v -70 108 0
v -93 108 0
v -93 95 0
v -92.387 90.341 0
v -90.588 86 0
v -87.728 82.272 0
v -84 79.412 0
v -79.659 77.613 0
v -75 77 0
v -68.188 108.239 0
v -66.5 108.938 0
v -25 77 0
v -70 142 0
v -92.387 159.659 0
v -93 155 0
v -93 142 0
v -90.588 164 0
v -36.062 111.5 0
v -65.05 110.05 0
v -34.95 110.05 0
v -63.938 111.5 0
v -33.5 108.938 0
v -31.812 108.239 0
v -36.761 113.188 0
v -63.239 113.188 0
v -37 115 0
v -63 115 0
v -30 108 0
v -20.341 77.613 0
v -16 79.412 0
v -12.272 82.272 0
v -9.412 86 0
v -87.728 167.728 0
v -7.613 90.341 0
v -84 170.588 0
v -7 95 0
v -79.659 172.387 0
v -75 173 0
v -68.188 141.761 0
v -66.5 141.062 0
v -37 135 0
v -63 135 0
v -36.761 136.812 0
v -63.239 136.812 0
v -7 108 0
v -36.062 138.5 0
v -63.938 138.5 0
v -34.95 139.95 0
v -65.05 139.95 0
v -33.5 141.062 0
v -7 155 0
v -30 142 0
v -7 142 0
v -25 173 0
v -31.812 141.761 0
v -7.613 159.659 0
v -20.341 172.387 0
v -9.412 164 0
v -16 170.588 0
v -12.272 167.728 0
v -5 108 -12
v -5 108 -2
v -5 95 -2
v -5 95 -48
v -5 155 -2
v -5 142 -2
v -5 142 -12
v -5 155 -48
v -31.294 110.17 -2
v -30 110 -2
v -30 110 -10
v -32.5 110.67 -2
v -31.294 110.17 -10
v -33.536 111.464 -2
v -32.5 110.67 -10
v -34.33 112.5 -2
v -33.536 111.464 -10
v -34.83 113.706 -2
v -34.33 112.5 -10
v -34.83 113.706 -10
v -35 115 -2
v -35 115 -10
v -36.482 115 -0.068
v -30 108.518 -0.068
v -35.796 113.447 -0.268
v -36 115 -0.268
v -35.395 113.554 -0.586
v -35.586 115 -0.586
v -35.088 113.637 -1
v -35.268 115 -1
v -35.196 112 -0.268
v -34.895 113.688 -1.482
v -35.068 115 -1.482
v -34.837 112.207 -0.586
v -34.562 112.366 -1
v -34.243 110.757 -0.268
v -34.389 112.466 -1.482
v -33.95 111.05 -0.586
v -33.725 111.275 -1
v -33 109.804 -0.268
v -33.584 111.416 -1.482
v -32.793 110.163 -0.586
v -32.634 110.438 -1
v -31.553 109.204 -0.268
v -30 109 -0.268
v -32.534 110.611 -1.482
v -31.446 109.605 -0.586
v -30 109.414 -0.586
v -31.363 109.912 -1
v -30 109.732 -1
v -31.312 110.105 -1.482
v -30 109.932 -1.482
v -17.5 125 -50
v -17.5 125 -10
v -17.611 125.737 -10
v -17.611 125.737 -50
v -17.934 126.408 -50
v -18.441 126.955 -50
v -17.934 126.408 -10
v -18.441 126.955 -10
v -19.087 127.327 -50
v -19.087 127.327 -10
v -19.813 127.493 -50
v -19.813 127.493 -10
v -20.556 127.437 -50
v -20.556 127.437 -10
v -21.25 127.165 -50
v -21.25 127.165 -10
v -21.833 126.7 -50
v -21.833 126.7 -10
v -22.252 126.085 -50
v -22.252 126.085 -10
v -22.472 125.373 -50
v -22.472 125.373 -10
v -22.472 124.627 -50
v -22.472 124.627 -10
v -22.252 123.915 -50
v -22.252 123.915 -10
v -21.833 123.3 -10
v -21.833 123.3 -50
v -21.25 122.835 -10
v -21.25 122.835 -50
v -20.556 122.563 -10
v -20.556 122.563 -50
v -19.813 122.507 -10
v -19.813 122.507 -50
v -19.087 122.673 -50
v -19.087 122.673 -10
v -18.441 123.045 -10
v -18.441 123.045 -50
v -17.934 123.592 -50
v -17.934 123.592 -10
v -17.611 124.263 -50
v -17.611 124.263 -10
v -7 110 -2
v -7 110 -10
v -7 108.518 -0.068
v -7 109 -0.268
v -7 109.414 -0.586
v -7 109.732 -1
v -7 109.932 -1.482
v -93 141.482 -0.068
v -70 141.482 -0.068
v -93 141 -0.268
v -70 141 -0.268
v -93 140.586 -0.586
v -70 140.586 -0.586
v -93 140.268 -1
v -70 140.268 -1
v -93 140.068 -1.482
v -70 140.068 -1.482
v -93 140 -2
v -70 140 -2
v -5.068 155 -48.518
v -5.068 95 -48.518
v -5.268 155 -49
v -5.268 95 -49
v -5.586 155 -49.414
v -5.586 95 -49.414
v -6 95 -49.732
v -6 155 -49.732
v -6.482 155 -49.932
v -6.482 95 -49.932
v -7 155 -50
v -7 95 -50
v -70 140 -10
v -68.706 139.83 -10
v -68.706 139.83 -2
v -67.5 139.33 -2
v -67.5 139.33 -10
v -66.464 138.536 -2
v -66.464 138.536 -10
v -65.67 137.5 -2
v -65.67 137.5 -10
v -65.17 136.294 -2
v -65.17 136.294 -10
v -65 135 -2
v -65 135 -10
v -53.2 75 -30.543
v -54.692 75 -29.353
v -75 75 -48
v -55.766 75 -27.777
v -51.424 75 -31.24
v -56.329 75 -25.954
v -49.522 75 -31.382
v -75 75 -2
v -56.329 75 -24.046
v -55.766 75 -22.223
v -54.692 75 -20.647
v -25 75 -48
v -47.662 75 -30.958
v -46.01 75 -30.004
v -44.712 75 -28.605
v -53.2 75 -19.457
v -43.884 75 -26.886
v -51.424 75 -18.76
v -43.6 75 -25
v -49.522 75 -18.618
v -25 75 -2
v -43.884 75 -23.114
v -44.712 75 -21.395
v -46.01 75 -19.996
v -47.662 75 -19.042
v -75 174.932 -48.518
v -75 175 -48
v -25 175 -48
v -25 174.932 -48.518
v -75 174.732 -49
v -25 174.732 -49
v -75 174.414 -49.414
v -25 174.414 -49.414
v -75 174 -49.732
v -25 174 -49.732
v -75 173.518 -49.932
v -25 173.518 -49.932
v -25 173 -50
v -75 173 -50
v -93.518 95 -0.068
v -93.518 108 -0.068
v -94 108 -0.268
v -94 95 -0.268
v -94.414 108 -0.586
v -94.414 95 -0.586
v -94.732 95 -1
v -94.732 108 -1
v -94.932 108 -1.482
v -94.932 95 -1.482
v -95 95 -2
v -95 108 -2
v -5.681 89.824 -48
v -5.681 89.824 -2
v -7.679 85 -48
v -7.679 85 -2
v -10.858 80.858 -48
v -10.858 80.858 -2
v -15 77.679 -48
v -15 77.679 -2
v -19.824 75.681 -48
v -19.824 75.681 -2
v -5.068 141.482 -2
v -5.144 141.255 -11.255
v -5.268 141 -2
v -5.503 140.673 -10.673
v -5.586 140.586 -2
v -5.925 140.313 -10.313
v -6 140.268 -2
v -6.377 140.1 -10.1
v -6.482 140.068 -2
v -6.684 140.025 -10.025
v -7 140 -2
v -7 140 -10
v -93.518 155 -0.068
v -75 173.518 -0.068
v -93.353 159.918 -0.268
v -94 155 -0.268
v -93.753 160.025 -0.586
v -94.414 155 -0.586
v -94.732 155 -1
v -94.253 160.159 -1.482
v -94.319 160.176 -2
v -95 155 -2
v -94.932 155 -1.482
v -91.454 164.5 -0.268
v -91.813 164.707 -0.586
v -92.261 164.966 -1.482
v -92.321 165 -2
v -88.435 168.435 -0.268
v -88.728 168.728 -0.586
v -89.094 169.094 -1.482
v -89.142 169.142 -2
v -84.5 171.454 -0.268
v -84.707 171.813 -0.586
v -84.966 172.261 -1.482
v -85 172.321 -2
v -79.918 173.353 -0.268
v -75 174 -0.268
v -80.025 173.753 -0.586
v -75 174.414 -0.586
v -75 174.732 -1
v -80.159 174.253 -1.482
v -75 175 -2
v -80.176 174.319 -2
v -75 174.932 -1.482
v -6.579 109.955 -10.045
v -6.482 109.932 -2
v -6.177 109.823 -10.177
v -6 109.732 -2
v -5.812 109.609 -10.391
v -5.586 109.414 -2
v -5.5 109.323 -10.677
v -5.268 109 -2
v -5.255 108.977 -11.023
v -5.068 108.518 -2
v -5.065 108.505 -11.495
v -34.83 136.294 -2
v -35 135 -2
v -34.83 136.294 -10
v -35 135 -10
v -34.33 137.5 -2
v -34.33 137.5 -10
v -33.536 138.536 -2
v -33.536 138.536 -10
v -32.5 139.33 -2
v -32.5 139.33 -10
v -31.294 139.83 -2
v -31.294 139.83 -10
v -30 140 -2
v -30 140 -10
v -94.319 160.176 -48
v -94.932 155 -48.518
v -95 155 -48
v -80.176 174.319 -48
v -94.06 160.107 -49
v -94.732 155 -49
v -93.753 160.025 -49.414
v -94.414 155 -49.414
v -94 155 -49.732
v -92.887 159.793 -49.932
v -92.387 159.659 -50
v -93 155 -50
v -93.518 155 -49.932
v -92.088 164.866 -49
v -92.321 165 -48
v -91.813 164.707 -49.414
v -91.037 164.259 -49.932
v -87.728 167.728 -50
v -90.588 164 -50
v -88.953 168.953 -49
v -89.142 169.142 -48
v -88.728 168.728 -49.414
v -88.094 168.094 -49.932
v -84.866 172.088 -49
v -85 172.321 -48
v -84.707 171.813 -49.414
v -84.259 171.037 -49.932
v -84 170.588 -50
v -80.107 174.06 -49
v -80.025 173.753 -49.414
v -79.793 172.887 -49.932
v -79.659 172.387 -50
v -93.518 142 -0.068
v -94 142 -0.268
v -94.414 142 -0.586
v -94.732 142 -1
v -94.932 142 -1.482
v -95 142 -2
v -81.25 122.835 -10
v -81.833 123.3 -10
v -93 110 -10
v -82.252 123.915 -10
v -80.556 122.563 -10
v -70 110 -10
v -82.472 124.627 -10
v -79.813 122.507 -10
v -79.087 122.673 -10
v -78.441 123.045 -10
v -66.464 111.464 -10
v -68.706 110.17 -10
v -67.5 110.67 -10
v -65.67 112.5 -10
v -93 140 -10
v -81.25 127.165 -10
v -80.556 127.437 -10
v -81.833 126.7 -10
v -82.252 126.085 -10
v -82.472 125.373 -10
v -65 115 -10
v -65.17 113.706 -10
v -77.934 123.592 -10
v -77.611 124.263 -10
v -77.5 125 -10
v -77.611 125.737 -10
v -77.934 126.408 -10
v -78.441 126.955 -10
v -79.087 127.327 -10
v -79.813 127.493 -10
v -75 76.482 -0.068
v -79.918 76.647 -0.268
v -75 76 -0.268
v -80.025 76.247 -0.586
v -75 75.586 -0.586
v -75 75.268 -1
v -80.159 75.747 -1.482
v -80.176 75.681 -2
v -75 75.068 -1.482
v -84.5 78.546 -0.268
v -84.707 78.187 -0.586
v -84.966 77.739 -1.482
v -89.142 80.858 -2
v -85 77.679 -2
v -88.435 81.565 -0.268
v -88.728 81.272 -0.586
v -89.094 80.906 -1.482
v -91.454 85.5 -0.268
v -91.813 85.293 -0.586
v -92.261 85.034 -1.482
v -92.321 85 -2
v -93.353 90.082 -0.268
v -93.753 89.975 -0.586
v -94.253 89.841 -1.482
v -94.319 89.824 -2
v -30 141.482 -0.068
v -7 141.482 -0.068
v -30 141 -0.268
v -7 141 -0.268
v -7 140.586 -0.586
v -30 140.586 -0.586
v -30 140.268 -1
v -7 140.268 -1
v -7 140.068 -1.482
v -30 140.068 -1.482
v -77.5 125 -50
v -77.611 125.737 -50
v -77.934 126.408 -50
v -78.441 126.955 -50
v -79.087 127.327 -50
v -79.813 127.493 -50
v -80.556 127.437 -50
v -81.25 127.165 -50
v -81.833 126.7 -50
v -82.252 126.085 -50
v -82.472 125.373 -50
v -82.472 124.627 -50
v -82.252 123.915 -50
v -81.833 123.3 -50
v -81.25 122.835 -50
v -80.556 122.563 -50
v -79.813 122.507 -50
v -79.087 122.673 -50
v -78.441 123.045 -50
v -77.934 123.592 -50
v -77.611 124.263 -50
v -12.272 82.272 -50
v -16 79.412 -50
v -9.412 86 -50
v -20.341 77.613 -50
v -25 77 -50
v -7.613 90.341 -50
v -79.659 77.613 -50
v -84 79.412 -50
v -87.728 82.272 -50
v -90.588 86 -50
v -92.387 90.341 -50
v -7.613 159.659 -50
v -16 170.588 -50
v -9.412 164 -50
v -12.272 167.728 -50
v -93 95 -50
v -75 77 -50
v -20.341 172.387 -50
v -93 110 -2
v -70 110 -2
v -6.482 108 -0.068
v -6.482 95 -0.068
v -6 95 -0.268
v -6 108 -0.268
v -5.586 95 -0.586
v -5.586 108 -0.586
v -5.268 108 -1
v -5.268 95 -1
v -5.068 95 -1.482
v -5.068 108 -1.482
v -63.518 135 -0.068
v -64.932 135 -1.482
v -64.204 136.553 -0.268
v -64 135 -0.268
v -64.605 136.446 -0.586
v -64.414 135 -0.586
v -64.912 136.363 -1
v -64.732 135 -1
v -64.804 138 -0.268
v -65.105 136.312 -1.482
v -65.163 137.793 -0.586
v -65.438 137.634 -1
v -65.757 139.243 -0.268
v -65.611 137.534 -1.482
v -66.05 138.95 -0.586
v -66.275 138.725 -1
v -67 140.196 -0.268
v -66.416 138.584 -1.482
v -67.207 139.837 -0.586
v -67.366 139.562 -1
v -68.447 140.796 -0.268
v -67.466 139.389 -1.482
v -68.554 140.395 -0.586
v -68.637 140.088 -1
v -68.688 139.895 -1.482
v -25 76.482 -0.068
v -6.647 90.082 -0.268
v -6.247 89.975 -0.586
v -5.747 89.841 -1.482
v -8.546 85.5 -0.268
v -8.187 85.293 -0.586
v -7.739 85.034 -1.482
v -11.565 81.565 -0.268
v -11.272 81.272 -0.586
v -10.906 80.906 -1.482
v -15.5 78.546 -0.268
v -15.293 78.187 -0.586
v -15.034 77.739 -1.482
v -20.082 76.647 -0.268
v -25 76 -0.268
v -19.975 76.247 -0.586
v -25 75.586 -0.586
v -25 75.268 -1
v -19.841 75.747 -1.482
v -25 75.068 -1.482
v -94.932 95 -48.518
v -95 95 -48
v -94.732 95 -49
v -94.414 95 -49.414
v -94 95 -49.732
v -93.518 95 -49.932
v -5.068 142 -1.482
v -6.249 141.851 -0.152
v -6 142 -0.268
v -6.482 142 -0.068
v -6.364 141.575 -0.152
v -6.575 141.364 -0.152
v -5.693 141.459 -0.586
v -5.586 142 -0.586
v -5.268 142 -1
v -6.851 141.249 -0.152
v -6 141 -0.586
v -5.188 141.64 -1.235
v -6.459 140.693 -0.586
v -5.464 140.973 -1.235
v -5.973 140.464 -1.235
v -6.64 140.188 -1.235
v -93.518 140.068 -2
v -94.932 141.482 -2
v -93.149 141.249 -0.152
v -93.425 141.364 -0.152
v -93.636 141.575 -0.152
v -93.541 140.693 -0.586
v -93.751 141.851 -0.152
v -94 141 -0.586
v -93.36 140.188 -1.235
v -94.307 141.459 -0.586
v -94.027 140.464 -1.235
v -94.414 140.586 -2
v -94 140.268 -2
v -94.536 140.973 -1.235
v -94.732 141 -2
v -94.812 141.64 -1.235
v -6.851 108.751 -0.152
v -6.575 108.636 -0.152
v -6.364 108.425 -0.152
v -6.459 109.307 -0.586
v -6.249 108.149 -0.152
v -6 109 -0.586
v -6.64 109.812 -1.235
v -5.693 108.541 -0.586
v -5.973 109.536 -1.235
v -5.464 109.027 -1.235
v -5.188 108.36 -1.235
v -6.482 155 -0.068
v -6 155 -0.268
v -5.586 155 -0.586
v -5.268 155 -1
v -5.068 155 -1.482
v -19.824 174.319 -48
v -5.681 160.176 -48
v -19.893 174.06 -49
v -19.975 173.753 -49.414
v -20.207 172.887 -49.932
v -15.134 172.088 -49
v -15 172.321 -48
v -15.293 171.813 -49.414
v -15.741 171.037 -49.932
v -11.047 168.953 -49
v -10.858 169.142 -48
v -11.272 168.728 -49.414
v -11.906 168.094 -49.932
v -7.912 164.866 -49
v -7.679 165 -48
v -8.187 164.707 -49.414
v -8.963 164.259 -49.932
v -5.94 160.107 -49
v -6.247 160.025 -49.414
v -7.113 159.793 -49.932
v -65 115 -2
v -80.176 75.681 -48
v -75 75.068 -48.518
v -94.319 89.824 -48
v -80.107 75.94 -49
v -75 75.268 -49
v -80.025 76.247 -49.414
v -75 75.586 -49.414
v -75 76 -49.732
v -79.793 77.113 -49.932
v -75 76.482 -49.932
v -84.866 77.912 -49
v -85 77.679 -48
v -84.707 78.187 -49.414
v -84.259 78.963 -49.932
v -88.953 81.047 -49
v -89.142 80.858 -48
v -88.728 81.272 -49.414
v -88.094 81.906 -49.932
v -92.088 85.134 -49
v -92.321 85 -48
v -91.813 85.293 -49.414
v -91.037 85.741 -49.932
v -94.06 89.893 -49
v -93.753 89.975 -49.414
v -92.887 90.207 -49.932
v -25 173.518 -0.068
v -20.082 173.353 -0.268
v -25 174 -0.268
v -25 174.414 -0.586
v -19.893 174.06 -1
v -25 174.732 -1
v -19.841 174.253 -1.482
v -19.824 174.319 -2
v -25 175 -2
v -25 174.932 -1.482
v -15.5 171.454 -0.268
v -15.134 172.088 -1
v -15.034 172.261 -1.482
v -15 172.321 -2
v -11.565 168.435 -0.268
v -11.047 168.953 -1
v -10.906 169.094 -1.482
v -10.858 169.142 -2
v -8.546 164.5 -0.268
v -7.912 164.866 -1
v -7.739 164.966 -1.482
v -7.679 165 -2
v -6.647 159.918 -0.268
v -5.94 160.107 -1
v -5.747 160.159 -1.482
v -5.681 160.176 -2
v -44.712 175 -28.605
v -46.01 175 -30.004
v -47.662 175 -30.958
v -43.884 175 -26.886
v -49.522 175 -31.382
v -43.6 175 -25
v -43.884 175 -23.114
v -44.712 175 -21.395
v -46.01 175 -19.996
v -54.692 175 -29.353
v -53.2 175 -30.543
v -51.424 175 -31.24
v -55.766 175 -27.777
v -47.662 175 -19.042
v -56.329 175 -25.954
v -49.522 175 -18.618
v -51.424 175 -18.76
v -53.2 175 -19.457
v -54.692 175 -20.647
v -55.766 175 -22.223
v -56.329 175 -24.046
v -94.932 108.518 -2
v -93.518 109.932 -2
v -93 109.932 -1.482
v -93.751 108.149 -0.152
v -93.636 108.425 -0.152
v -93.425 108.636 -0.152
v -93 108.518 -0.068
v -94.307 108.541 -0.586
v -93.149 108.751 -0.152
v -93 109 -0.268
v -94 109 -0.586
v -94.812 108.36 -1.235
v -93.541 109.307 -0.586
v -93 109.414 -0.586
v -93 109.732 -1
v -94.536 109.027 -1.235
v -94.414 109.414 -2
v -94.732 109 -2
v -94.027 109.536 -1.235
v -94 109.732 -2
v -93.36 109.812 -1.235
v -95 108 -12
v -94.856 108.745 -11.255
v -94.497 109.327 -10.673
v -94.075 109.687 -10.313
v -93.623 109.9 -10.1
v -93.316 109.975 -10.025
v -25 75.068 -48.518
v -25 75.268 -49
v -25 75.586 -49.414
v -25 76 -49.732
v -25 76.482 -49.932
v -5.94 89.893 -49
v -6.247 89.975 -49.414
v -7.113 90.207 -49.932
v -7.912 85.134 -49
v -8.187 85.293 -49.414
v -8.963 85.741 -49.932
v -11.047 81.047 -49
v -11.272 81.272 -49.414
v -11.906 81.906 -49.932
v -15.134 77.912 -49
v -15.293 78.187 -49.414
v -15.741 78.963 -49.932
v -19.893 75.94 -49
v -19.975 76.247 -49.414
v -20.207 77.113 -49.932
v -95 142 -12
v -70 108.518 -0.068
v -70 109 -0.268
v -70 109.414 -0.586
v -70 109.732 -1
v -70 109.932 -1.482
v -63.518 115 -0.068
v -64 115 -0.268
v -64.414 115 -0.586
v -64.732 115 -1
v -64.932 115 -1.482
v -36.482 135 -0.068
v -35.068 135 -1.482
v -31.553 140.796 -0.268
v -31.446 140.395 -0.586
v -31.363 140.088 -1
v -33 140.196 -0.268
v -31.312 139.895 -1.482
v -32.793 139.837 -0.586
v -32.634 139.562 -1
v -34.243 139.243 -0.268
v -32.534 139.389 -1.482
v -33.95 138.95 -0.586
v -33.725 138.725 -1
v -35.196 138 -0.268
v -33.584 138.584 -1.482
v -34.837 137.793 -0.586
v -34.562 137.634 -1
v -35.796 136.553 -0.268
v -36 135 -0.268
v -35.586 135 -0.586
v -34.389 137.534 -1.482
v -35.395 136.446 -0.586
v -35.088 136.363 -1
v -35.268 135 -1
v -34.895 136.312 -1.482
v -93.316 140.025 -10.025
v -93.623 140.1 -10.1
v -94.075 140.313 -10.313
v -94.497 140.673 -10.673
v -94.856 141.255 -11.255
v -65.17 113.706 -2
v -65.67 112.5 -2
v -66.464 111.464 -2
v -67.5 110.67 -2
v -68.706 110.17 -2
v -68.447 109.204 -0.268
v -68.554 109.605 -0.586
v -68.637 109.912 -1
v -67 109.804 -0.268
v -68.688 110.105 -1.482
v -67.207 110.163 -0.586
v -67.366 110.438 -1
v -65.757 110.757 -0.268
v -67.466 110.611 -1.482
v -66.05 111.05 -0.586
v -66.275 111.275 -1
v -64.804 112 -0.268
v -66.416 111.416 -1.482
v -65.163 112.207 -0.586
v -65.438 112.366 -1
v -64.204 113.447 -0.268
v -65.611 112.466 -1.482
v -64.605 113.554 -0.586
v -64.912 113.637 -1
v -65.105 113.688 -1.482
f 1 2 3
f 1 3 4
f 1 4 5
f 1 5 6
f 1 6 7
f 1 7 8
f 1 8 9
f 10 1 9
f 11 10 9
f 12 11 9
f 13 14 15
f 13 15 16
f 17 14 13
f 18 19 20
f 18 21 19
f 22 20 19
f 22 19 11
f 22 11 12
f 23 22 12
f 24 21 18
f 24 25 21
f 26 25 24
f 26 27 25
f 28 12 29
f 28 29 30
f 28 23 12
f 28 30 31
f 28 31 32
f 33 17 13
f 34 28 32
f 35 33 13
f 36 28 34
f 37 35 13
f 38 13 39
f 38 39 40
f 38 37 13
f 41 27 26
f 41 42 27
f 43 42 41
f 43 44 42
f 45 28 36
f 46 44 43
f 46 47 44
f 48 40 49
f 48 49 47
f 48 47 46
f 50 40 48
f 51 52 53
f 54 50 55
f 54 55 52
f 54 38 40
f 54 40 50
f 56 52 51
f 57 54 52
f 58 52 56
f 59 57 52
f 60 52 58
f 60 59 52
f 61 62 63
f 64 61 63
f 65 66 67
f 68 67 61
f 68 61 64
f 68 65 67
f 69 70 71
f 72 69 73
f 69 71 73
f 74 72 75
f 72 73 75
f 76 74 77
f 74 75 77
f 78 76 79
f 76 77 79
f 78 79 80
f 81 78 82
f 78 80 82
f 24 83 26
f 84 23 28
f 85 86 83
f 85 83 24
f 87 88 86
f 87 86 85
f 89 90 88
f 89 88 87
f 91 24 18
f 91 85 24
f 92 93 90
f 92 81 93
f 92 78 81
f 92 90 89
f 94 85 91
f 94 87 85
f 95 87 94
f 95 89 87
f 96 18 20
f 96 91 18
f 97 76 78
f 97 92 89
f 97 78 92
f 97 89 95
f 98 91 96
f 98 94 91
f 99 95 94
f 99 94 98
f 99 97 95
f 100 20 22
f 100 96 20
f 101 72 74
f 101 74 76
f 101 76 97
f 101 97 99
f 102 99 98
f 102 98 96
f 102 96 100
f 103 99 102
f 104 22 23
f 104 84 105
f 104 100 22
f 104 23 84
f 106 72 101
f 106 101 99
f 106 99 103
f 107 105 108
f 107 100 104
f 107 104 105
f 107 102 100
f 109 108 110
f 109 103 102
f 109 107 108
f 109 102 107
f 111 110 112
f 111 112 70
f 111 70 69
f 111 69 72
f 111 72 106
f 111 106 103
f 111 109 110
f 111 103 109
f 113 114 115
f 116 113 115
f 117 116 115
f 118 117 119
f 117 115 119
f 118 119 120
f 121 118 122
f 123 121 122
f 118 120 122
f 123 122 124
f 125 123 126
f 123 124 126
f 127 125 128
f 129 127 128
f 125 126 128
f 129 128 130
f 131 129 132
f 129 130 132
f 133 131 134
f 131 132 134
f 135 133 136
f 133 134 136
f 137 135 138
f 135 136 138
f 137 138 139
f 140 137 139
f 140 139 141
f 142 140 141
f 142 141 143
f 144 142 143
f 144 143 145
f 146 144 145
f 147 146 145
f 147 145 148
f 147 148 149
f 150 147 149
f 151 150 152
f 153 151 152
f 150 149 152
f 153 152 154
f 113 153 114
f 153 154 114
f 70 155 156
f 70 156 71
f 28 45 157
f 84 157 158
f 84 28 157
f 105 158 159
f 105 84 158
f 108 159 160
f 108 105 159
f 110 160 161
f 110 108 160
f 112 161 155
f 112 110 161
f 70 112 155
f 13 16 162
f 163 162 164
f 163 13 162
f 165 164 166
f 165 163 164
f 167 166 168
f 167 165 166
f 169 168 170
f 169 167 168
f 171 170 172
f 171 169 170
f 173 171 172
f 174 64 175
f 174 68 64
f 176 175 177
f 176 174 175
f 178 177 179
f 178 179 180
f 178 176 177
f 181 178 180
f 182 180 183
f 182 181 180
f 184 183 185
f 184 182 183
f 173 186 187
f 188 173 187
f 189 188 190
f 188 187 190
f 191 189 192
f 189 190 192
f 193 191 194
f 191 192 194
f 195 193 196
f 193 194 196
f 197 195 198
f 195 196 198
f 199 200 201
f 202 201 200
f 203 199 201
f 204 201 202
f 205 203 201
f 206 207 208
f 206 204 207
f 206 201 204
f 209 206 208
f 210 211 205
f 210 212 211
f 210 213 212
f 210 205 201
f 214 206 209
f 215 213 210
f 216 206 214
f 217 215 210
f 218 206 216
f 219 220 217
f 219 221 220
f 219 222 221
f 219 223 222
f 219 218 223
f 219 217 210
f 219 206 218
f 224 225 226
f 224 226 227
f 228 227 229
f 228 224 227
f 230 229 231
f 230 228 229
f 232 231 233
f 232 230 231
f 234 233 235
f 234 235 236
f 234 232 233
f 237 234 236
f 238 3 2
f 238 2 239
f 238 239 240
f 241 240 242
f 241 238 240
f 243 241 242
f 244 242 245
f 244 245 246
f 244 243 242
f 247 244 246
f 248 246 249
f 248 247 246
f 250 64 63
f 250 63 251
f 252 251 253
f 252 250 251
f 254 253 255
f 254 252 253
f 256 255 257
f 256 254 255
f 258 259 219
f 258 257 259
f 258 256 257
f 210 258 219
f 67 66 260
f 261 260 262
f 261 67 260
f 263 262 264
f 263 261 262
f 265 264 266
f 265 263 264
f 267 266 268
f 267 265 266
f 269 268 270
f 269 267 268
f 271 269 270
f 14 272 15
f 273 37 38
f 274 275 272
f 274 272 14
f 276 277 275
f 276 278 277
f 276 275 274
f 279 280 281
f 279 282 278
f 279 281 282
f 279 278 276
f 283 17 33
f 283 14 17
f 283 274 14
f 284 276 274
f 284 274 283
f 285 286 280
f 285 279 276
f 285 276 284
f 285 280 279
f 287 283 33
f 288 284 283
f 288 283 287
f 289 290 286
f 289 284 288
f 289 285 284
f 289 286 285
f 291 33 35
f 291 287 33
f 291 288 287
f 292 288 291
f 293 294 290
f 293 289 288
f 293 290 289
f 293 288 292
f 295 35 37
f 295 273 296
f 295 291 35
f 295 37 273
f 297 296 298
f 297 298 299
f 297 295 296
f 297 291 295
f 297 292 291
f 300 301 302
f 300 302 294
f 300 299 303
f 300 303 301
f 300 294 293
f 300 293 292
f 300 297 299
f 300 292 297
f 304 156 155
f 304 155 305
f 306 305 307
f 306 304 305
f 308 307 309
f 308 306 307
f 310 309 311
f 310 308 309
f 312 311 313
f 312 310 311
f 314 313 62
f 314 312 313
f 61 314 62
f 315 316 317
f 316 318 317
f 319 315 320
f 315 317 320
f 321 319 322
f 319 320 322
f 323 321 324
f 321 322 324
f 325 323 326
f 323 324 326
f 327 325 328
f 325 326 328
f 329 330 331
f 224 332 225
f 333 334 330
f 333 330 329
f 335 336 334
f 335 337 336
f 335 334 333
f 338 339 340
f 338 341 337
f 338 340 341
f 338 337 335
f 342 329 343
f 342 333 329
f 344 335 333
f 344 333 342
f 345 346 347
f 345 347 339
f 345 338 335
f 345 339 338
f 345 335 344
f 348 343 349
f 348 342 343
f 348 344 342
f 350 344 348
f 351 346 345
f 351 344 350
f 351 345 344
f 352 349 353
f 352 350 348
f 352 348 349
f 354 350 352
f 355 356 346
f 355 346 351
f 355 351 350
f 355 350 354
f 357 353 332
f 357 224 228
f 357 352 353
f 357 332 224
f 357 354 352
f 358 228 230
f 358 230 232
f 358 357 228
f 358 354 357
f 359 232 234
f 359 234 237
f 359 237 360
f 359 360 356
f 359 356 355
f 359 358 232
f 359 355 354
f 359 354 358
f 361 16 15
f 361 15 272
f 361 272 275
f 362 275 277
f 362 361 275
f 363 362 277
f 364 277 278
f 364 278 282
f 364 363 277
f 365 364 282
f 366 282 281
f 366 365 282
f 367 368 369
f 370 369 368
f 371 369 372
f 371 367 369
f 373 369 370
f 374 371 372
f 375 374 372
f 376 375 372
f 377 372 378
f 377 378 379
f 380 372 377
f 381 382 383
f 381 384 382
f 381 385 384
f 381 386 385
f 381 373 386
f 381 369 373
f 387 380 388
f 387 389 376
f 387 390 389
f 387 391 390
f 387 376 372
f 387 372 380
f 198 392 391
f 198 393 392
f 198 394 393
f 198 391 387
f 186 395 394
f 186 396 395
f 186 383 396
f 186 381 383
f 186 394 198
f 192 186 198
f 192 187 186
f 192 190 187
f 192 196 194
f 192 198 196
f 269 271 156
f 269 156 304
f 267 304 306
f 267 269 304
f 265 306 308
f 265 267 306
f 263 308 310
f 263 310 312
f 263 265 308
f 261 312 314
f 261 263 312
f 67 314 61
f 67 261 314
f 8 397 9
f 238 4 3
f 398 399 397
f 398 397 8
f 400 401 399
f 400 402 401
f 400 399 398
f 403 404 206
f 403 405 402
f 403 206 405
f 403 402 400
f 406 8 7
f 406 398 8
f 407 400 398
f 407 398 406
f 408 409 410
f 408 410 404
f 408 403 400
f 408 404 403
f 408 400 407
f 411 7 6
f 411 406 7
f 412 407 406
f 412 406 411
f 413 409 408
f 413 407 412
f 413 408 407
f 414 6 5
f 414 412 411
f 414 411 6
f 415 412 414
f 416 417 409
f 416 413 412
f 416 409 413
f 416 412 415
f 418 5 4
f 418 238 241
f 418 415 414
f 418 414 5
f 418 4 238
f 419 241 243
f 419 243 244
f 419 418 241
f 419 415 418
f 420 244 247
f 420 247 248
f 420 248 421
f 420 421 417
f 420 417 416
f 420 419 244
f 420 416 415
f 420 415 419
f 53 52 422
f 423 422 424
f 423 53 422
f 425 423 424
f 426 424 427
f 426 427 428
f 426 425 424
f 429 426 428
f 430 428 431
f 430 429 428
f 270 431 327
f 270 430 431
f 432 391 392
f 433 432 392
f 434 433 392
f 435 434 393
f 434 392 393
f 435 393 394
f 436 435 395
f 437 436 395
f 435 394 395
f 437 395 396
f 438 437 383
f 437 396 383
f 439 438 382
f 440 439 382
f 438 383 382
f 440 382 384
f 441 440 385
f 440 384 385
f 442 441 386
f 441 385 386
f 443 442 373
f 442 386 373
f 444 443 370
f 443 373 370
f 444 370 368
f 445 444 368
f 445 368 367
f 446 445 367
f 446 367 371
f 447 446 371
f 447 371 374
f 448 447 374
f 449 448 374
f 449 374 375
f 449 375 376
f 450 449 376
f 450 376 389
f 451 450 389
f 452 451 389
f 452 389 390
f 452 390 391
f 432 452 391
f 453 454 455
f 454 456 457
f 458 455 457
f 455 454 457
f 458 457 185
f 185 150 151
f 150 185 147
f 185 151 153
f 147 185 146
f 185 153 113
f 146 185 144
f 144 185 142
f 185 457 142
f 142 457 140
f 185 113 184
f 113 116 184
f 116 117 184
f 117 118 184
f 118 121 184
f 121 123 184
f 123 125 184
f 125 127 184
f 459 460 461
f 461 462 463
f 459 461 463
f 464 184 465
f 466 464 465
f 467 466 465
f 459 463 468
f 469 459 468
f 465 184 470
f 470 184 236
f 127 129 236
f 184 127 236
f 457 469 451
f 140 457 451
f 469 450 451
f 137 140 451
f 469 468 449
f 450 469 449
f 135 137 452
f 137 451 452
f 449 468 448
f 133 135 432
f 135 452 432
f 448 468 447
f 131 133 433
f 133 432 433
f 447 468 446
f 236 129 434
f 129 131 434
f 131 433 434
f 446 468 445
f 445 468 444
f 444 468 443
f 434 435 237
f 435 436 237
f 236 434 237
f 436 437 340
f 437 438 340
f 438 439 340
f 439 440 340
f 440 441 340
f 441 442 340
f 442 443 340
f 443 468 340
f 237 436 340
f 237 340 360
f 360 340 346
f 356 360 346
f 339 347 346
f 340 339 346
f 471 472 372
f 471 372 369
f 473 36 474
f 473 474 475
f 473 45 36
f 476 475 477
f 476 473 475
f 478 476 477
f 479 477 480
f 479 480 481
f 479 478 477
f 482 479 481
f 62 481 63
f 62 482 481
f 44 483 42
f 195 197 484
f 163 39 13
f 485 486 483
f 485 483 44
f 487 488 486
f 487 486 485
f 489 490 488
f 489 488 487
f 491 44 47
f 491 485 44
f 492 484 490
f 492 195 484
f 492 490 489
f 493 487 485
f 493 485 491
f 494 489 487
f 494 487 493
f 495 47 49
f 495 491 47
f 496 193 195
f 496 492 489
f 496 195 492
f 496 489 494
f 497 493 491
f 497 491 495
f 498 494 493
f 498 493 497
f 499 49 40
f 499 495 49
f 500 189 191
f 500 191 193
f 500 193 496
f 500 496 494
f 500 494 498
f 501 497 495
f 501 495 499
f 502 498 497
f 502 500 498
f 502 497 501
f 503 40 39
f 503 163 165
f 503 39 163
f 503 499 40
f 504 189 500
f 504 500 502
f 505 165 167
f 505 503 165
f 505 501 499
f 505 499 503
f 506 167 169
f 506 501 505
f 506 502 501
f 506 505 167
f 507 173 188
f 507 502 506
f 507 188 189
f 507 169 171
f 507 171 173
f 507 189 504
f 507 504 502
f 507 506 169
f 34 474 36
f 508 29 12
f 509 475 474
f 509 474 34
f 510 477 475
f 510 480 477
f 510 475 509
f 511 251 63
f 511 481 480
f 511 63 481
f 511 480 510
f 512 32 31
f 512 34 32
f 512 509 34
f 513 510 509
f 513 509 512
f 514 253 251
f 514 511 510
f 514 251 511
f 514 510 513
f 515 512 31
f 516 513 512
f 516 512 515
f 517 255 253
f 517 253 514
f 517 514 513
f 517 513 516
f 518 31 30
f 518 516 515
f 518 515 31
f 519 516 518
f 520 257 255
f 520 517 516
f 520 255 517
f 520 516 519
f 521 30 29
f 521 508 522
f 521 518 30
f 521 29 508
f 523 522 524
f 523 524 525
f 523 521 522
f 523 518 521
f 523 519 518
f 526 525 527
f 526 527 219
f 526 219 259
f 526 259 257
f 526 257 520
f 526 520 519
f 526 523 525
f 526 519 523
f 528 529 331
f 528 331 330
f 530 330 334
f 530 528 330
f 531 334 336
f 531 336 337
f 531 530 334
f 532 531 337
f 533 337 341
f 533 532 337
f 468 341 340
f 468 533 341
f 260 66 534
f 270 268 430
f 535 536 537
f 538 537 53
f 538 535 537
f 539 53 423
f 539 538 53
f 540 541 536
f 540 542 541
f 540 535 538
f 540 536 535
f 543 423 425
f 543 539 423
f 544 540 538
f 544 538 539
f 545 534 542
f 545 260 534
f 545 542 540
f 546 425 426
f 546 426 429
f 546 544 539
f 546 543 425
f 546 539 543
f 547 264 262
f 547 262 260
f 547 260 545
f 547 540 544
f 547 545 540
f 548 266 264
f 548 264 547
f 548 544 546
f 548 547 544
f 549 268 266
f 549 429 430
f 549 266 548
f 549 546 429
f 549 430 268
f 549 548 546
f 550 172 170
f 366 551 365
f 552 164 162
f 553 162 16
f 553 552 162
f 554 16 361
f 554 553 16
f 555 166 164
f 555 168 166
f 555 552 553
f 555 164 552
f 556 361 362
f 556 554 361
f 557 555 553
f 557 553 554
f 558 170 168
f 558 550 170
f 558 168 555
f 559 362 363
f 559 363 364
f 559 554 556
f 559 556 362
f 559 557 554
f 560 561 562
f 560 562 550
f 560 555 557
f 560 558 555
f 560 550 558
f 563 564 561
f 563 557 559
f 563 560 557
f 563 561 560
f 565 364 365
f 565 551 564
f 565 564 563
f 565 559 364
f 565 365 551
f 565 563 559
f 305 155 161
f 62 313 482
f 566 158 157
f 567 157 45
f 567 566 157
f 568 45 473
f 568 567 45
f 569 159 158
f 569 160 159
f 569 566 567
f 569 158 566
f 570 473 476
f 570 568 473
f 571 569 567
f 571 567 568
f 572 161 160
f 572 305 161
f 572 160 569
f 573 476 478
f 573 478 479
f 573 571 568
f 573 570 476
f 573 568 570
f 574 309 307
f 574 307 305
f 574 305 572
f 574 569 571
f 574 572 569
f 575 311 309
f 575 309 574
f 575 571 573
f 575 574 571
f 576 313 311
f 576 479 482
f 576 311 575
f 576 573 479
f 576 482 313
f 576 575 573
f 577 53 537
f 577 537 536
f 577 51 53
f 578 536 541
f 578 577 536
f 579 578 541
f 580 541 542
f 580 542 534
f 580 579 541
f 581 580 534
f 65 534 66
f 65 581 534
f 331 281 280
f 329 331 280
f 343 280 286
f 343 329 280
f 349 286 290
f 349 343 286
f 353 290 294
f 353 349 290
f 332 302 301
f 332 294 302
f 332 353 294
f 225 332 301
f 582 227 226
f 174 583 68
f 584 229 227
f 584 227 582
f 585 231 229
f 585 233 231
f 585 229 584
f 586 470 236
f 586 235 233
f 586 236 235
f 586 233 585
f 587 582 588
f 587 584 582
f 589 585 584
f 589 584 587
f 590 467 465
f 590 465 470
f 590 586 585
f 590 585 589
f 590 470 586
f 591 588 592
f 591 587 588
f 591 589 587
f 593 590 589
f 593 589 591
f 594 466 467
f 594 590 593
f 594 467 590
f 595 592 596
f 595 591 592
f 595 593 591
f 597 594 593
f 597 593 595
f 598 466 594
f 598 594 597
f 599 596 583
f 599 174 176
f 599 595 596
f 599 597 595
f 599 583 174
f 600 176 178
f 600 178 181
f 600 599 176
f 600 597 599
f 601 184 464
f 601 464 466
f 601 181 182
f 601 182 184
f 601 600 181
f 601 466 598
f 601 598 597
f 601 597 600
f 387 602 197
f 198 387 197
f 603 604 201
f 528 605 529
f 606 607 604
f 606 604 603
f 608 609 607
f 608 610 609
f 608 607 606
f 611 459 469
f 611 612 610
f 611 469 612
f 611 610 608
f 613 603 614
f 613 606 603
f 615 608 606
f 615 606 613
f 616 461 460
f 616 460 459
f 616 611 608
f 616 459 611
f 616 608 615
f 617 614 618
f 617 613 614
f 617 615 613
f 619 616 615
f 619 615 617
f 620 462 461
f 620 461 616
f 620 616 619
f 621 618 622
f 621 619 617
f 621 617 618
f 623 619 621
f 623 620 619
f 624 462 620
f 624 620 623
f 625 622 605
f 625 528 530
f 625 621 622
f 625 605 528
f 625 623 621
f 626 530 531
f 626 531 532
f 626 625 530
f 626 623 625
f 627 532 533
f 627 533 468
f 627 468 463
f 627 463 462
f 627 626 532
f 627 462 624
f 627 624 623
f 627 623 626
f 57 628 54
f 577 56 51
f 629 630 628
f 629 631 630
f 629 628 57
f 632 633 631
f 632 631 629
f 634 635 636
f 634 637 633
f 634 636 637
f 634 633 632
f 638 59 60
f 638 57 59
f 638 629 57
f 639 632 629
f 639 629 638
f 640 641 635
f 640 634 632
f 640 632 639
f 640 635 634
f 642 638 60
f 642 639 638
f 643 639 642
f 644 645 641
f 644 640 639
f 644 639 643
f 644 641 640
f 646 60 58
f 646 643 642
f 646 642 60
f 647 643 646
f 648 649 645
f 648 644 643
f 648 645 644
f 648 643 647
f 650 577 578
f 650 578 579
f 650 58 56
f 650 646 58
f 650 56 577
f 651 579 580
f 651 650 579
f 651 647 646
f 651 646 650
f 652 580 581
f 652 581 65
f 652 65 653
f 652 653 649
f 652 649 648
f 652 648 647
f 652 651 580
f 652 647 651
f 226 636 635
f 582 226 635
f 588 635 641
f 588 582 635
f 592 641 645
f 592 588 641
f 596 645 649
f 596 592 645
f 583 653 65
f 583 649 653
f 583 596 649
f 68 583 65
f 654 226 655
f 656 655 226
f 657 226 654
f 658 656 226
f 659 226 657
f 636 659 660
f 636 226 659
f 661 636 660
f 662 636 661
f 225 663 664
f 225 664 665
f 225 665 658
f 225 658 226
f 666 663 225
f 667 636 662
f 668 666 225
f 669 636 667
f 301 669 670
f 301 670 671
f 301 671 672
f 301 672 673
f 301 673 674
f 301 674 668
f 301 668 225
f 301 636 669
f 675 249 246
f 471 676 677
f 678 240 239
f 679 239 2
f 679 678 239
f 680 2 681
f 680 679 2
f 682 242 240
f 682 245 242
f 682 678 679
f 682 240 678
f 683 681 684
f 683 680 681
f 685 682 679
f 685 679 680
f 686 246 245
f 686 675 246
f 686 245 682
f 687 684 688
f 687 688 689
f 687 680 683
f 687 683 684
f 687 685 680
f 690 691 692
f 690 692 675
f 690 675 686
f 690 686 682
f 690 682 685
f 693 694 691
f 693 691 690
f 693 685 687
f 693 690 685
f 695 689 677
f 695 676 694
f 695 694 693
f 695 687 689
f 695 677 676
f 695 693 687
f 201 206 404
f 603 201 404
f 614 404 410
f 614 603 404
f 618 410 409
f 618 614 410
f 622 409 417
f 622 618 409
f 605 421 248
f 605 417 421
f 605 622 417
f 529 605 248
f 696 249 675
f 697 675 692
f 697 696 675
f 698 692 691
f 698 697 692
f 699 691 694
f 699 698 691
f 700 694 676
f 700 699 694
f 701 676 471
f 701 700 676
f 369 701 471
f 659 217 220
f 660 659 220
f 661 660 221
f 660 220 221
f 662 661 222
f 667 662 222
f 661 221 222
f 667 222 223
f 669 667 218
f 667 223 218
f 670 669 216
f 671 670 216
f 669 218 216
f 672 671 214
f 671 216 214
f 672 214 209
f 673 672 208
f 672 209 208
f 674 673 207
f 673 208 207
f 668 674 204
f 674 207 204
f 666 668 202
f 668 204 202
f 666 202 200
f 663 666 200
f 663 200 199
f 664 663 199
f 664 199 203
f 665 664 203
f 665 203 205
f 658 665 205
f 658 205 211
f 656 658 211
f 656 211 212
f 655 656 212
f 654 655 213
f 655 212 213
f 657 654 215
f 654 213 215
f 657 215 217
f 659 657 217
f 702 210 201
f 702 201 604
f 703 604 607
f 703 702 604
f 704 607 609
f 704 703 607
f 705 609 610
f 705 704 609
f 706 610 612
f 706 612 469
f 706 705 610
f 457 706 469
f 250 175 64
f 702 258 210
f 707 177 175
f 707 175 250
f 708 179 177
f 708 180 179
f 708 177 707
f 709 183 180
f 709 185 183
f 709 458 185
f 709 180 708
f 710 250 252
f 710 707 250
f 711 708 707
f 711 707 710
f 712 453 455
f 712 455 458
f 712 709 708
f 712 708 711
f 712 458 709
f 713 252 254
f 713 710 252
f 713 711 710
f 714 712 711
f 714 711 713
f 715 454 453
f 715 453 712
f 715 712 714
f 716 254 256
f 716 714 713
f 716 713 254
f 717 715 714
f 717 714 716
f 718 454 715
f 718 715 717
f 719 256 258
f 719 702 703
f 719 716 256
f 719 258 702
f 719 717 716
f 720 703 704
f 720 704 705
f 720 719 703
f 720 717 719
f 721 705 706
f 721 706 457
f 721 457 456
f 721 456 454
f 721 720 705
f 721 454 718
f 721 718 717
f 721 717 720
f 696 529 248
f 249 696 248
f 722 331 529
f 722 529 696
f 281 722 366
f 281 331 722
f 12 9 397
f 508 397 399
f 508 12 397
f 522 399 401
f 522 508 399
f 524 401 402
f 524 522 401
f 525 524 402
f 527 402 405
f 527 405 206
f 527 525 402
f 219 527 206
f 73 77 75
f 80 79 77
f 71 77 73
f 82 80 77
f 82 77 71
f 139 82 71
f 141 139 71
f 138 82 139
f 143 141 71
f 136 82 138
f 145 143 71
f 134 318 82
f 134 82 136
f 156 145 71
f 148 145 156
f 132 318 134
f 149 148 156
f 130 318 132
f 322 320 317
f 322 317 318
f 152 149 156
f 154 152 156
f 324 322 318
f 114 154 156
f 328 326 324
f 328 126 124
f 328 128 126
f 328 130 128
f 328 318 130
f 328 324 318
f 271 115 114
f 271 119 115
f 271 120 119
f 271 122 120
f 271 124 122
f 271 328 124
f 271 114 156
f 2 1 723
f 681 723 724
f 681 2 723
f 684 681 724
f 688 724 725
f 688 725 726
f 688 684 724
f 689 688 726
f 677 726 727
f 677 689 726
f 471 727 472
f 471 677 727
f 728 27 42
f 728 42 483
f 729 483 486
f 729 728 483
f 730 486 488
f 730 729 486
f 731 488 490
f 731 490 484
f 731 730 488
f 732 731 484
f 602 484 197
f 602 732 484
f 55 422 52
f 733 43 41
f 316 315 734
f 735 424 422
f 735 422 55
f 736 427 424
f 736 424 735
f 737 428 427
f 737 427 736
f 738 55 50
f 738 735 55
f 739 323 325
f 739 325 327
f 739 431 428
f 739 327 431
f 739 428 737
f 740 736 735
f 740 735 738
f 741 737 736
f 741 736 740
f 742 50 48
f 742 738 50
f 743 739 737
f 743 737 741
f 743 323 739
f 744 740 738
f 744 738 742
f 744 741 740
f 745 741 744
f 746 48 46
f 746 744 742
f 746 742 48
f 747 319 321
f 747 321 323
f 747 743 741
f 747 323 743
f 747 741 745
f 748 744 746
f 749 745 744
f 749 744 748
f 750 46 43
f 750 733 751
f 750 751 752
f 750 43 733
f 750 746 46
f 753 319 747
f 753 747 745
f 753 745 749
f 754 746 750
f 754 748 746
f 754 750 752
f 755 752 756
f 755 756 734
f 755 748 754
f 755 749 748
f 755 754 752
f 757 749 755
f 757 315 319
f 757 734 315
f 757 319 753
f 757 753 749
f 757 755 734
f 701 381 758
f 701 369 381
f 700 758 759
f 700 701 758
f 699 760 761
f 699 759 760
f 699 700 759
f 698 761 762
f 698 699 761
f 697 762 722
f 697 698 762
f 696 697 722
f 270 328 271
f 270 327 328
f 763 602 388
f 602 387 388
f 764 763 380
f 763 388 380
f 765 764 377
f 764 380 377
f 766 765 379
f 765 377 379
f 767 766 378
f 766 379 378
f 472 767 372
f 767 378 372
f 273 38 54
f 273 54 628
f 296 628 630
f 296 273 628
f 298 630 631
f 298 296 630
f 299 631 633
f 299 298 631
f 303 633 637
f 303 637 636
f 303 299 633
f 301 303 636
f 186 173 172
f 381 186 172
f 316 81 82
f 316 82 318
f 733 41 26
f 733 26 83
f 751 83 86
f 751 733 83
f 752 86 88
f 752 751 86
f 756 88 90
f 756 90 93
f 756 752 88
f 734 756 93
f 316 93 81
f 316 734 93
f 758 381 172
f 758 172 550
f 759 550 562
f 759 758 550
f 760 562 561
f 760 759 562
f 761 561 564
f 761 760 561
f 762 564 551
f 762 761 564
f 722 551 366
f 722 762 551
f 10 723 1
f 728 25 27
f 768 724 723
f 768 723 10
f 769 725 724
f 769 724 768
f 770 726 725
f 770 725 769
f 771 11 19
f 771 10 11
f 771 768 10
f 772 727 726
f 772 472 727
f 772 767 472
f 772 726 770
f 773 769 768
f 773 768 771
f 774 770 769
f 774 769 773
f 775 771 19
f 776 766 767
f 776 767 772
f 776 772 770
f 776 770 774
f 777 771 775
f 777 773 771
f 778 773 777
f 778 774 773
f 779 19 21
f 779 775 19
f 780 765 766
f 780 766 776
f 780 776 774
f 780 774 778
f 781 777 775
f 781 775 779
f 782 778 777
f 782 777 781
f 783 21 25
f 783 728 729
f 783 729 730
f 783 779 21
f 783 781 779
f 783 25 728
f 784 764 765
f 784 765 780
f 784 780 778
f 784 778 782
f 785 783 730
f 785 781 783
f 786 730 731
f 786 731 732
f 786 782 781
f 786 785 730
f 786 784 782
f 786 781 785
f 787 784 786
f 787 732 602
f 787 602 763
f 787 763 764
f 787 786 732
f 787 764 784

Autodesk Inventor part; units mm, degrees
ref_plane "YZ Plane" through (0, 0, 0) normal (1, 0, 0) x (0, 1, 0)
ref_plane "XZ Plane" through (0, 0, 0) normal (0, 1, 0) x (-1, 0, 0)
ref_plane "XY Plane" through (0, 0, 0) normal (0, 0, 1) x (1, 0, 0)
sketch "Sketch1" plane through (0, 0, 0) normal (0, 1, 0) x (-1, 0, 0)
  line L0 (0, 0) -> (100, 0)
  line L1 (100, 0) -> (100, -50)
  line L2 (100, -50) -> (0, -50)
  line L3 (0, -50) -> (0, 0)
  dimension "d0" = 100
  dimension "d1" = 50
extrude "Extrusion1" add sketch "Sketch1" along normal blind 250
sketch "Sketch5" plane through (0, 0, -50) normal (0, 0, -1) x (-1, 0, 0)
  line L0 (0, 250) -> (100, 250) projected
  line L1 (100, 0) -> (100, 250) projected
  circle A0 centre (50, 125) radius 5
  point P0 (0, 0)
  dimension "d85" = 10
extrude "Extrusion5" cut sketch "Sketch5" against normal through all
sketch "Sketch6" plane through (0, 0, 0) normal (0, -1, 0) x (1, 0, 0)
  line L0 (-100, 0) -> (0, 0) projected
  line L1 (0, -50) -> (-15, -50)
  line L2 (-15, -50) -> (-15, 0)
  line L3 (-15, 0) -> (0, 0)
  line L4 (0, 0) -> (0, -50)
  line L5 (-100, -50) -> (-100, 0) projected
  line L6 (-100, -50) -> (-85, -50)
  line L7 (-85, -50) -> (-85, 0)
  line L8 (-85, 0) -> (-100, 0)
  line L9 (-100, 0) -> (-100, -50)
  dimension "d18" = 15
  dimension "d19" = 15
extrude "Extrusion6" cut sketch "Sketch6" against normal through all
sketch "Sketch7" plane through (0, 0, 0) normal (0, -1, 0) x (1, 0, 0)
  line L0 (-15, -50) -> (-85, -50) projected
  line L1 (-85, 0) -> (-15, 0) projected
  line L2 (-15, -50) -> (-85, -50)
  line L3 (-85, -50) -> (-85, 0)
  line L4 (-85, 0) -> (-15, 0)
  line L5 (-15, 0) -> (-15, -50)
  point P0 (0, 0)
extrude "Extrusion7" cut sketch "Sketch7" against normal blind 50
sketch "Sketch8" plane through (0, 250, 0) normal (0, 1, 0) x (1, 0, 0)
  line L0 (-15, 50) -> (-85, 50) projected
  line L1 (-15, 0) -> (-15, 50) projected
  line L2 (-85, 50) -> (-15, 50)
  line L3 (-15, 50) -> (-15, 0)
  line L4 (-15, 0) -> (-85, 0)
  line L5 (-85, 0) -> (-85, 50)
  point P0 (0, 0)
extrude "Extrusion8" cut sketch "Sketch8" against normal blind 50
sketch "Sketch14" plane through (0, 200, 0) normal (0, 1, 0) x (1, 0, 0)
  point P0 (0, 0)
sketch "Sketch15" plane through (0, 200, 0) normal (0, 1, 0) x (1, 0, 0)
  line L0 (-15, 50) -> (-15, 0) projected
  line L1 (-85, 0) -> (-85, 50) projected
  line L2 (-15, 50) -> (-85, 50)
  line L3 (-85, 50) -> (-85, 45)
  line L4 (-85, 45) -> (-15, 45)
  line L5 (-15, 45) -> (-15, 50)
  line L6 (-15, 0) -> (-85, 0)
  line L7 (-85, 0) -> (-85, 5)
  line L8 (-85, 5) -> (-15, 5)
  line L9 (-15, 5) -> (-15, 0)
  point P0 (0, 0)
  dimension "d46" = 5
  dimension "d47" = 5
extrude "Extrusion13" cut sketch "Sketch15" against normal through all contours L0 L4 L1 L2 | L0 L6 L1 L8
sketch "Sketch16" plane through (-85, 50, -45) normal (-1, 0, 0) x (0, 0, 1)
  line L0 (45, 92.6169) -> (35, 92.6169)
  line L1 (35, 92.6169) -> (35, 57.3831)
  line L2 (35, 57.3831) -> (45, 57.3831)
  line L3 (45, 57.3831) -> (45, 92.6169)
  line L4 (40, 150) -> (40, 0) projected
  line L5 (45, 92.6169) -> (35, 57.3831) construction
  line L6 (35, 92.6169) -> (45, 57.3831) construction
  line L7 (40, 92.6169) -> (40, 57.3831)
  point P0 (45, -50)
  point P1 (40, 75)
  dimension "d50" = 10
extrude "Extrusion14" add sketch "Sketch16" along normal blind 34.5 contours L4 L2 L1 L0
sketch "Sketch17" plane through (-85, 200, -5) normal (0, 0, 1) x (1, 0, 0)
  line L0 (-34.5, -92.6169) -> (-34.5, -57.3831) projected
  line L1 (-34.5, -75) -> (-29.5, -75)
  circle A0 centre (-29.5, -75) radius 2.5
  point P0 (85, -200)
  dimension "d53" = 5
  dimension "d54" = 5
extrude "Extrusion15" cut sketch "Sketch17" against normal through all
thread "Thread1" size "M5x0.8" class "6H" standard "ANSI Metric M Profile" full length
sketch "Sketch19" plane through (-119.5, 50, -45) normal (-1, 0, 0) x (0, 0, 1)
  line L0 (40, 57.3831) -> (40, 92.6169) projected
  line L1 (40, 57.3831) -> (35, 57.3831) projected
  line L2 (40, 92.6169) -> (35, 92.6169)
  line L3 (35, 92.6169) -> (35, 57.3831)
  line L4 (35, 57.3831) -> (40, 57.3831)
  line L5 (40, 57.3831) -> (40, 92.6169)
  point P0 (45, -50)
extrude "Extrusion17" add sketch "Sketch19" along normal blind 32
sketch "Sketch20" plane through (-85, 200, -5) normal (0, 0, 1) x (1, 0, 0)
  line L0 (-66.5, -92.6169) -> (-66.5, -57.3831) projected
  circle A0 centre (-61.5, -75) radius 2.5
  point P0 (85, -200)
  dimension "d73" = 5
extrude "Extrusion18" cut sketch "Sketch20" against normal blind 32
thread "Thread2" size "M5x0.8" class "6H" standard "ANSI Metric M Profile" full length
sketch "Sketch21" plane through (0, 50, 0) normal (0, -1, 0) x (1, 0, 0)
  line L0 (-15, -5) -> (-85, -5) projected
  line L1 (-15, -5) -> (-15, -45) projected
  circle A0 centre (-50, -25) radius 7.5
  point P0 (0, 0)
  dimension "d86" = 15
extrude "Extrusion19" cut sketch "Sketch21" against normal blind 55
sketch "Sketch22" plane through (0, 200, 0) normal (0, 1, 0) x (1, 0, 0)
  circle A0 centre (-50, 25) radius 7.5
  point P0 (0, 0)
  dimension "d87" = 15
extrude "Extrusion20" cut sketch "Sketch22" against normal blind 55
fillet "Fillet1" radius 10 4 edges at (-85, 200, -25) (-15, 200, -25) (-85, 50, -25) (-15, 50, -25)
sketch "Sketch23" plane through (-85, 107.3831, -10) normal (0, 0, -1) x (-1, 0, 0)
  circle A0 centre (61.5, 17.6169) radius 2.5 projected
  circle A1 centre (61.5, 17.6169) radius 2.5 projected
  line L0 (66.5, 35.2339) -> (66.5, 0) projected
  circle A2 centre (29.5, 17.6169) radius 2.5 projected
  line L1 (0, 0) -> (66.5, 0) projected
  circle A3 centre (61.5, 17.6169) radius 2.5 projected
  circle A4 centre (29.5, 17.6169) radius 2.5 projected
  line L2 (0, 0) -> (0, 35.2339) projected
  line L3 (0, 0) -> (66.5, 0) projected
  line L4 (66.5, 35.2339) -> (66.5, 0) projected
  line L5 (0, 35.2339) -> (66.5, 35.2339) projected
  point P0 (-85, -107.3831)
extrude "Extrusion21" add sketch "Sketch23" along normal blind 5
fillet "Fillet2" radius 30 2 edges at (-85, 142.6169, -10) (-85, 107.3831, -10)
fillet "Fillet3" radius 10 2 edges at (-151.5, 107.3831, -10) (-151.5, 142.6169, -10)
fillet "Fillet4" radius 20 1 edges at (-85, 125, -15)
sketch "Sketch25" plane through (-151.5, 50, -45) normal (-1, 0, 0) x (0, 0, 1)
  line L0 (30, 92.6169) -> (40, 92.6169) projected
  line L1 (30, 92.6169) -> (40, 92.6169)
  line L2 (40, 92.6169) -> (40, 57.3831)
  line L3 (40, 57.3831) -> (30, 57.3831)
  line L4 (30, 57.3831) -> (30, 92.6169)
  point P0 (45, -50)
extrude "Extrusion22" add sketch "Sketch25" against normal blind 10
fillet "Fillet5" radius 10 2 edges at (-151.5, 107.3831, -10) (-151.5, 142.6169, -10)
sketch "Sketch26" plane through (-75, 200, -5) normal (0, 0, 1) x (1, 0, 0)
  circle A0 centre (-71.5, -75) radius 2.5
  circle A1 centre (-39.5, -75) radius 2.5 projected
  point P0 (75, -200)
  dimension "d91" = 5
  dimension "d92" = 32
extrude "Extrusion23" cut sketch "Sketch26" against normal blind 10 contours A0
sketch "Sketch27" plane through (0, 200, 0) normal (0, 1, 0) x (1, 0, 0)
  line L0 (-85, 45) -> (-85, 5) projected
  line L1 (-5.7432, 0) -> (-85, 0)
  line L2 (-85, 0) -> (-85, 45)
  line L3 (-85, 45) -> (-5.7432, 45)
  line L4 (-5.7432, 45) -> (-5.7432, 0)
  line L5 (-85, 0) -> (-209.0524, 0)
  line L6 (-209.0524, 0) -> (-209.0524, 63.2581)
  line L7 (-209.0524, 63.2581) -> (-85, 63.2581)
  line L8 (-85, 63.2581) -> (-85, 0)
  point P0 (0, 0)
extrude "Extrusion24" cut sketch "Sketch27" against normal up to surface (150 mm away) contours L0 L2 L5 L6 L7 L8
sketch "Sketch28" plane through (-75, 200, -5) normal (0, 0, 1) x (1, 0, 0)
  line L0 (-10, -140) -> (-10, -10) projected
  arc A0 (-10, -140) -> (0, -150) centre (0, -140) ccw projected
  line L1 (50, -150) -> (0, -150) projected
  arc A1 (50, -150) -> (60, -140) centre (50, -140) ccw projected
  line L2 (60, -10) -> (60, -140) projected
  arc A2 (60, -10) -> (50, 0) centre (50, -10) ccw projected
  line L3 (0, 0) -> (50, 0) projected
  arc A3 (0, 0) -> (-10, -10) centre (0, -10) ccw projected
  circle A4 centre (25, -75) radius 5 projected
  line L4 (32.5, -95) -> (17.5, -95) projected
  arc A5 (50, -150) -> (60, -140) centre (50, -140) ccw projected
  line L5 (0, -150) -> (50, -150) projected
  arc A6 (-10, -140) -> (0, -150) centre (0, -140) ccw projected
  line L6 (-10, -10) -> (-10, -140) projected
  arc A7 (0, 0) -> (-10, -10) centre (0, -10) ccw projected
  line L7 (50, 0) -> (0, 0) projected
  arc A8 (60, -10) -> (50, 0) centre (50, -10) ccw projected
  line L8 (60, -140) -> (60, -10) projected
  circle A9 centre (25, -75) radius 5 projected
  point P0 (75, -200)
extrude "Extrusion25" add sketch "Sketch28" along normal blind 5
sketch "Sketch29" plane through (-25, 200, -45) normal (0, 0, -1) x (-1, 0, 0)
  arc A0 (-10, -140) -> (0, -150) centre (0, -140) ccw projected
  line L0 (50, -150) -> (0, -150) projected
  arc A1 (50, -150) -> (60, -140) centre (50, -140) ccw projected
  line L1 (60, -10) -> (60, -140) projected
  arc A2 (60, -10) -> (50, 0) centre (50, -10) ccw projected
  line L2 (0, 0) -> (50, 0) projected
  arc A3 (0, 0) -> (-10, -10) centre (0, -10) ccw projected
  line L3 (-10, -140) -> (-10, -10) projected
  circle A4 centre (25, -75) radius 5 projected
  point P0 (-25, -200)
extrude "Extrusion26" add sketch "Sketch29" along normal blind 5
sketch "Sketch37" plane through (-75, 200, 0) normal (0, 0, 1) x (1, 0, 0)
  point P0 (75, -200)
sketch "Sketch38" plane through (0, 50, 0) normal (0, -1, 0) x (1, 0, 0)
  line L0 (-85, 0) -> (-15, 0)
  line L1 (-15, 0) -> (-15, -50)
  line L2 (-15, -50) -> (-85, -50)
  line L3 (-85, -50) -> (-85, 0)
  circle A0 centre (-50, -25) radius 7.5 projected
  line L4 (-85, 0) -> (-15, -50) construction
  line L5 (-15, 0) -> (-85, -50) construction
  point P0 (0, 0)
extrude "Extrusion32" cut sketch "Sketch38" against normal blind 10
sketch "Sketch39" plane through (0, 200, 0) normal (0, 1, 0) x (1, 0, 0)
  line L0 (-15, 0) -> (-85, 0)
  line L1 (-85, 0) -> (-85, 50)
  line L2 (-85, 50) -> (-15, 50)
  line L3 (-15, 50) -> (-15, 0)
  circle A0 centre (-50, 25) radius 7.5 projected
  line L4 (-15, 0) -> (-85, 50) construction
  line L5 (-85, 0) -> (-15, 50) construction
  point P0 (0, 0)
extrude "Extrusion33" cut sketch "Sketch39" against normal blind 10
sketch "Sketch40" plane through (-85, 60, -50) normal (-1, 0, 0) x (0, 0, 1)
  line L0 (50, 130) -> (0, 130) projected
  line L1 (50, 0) -> (0, 0) projected
  line L2 (50, 130) -> (0, 130)
  line L3 (0, 130) -> (0, 0)
  line L4 (0, 0) -> (50, 0)
  line L5 (50, 0) -> (50, 130)
  point P0 (50, -60)
extrude "Extrusion34" add sketch "Sketch40" along normal blind 10
sketch "Sketch41" plane through (-15, 60, 0) normal (1, 0, 0) x (0, 0, -1)
  line L0 (0, 130) -> (50, 130) projected
  line L1 (0, 0) -> (0, 130) projected
  line L2 (50, 130) -> (0, 130)
  line L3 (0, 130) -> (0, 0)
  line L4 (0, 0) -> (50, 0)
  line L5 (50, 0) -> (50, 130)
  point P0 (0, -60)
extrude "Extrusion35" add sketch "Sketch41" along normal blind 10
sketch "Sketch42" plane through (-75, 200, 0) normal (0, 0, 1) x (1, 0, 0)
  line L0 (-20, -10) -> (-20, -140) projected
  line L1 (-20, -95) -> (-20, -55)
  line L2 (10, -75) -> (10, -90)
  line L3 (10, -75) -> (10, -60)
  line L4 (10, -60) -> (-20, -60)
  line L5 (10, -90) -> (-20, -90)
  line L6 (-20, -75) -> (10, -75)
  circle A0 centre (-5, -75) radius 2.5
  point P0 (75, -200)
  dimension "d144" = 5
extrude "Extrusion36" cut sketch "Sketch42" against normal blind 10 contours L4 L3 L6 A0 L0 | L6 A0 L2 L5 L0
sketch "Sketch43" plane through (-75, 200, 0) normal (0, 0, 1) x (1, 0, 0)
  line L0 (-20, -140) -> (-20, -10) projected
  point P0 (75, -200)
extrude "Extrusion37" cut sketch "Sketch42" against normal up to surface (50 mm away) contours A0 L6 | L6 A0
sketch "Sketch44" plane through (-75, 200, 0) normal (0, 0, 1) x (1, 0, 0)
  line L0 (-20, -60) -> (10, -60) projected
  line L1 (10, -90) -> (-20, -90) projected
  line L2 (10, -60) -> (10, -90) projected
  line L3 (70, -140) -> (70, -10) projected
  line L4 (70, -90) -> (40, -90)
  line L5 (40, -90) -> (40, -60)
  line L6 (40, -60) -> (70, -60)
  line L7 (70, -60) -> (70, -90)
  circle A0 centre (55, -75) radius 2.5
  point P0 (75, -200)
  dimension "d147" = 30
  dimension "d150" = 5
extrude "Extrusion38" cut sketch "Sketch44" against normal blind 10
extrude "Extrusion39" cut sketch "Sketch44" against normal up to surface (50 mm away) contours A0
fillet "Fillet7" radius 5 4 edges at (-35, 110, -5) (-35, 140, -5) (-65, 140, -5) (-65, 110, -5)
fillet "Fillet8" radius 2 6 edges at (-5, 110, -5) (-5, 140, -5) (-5, 125, -10) (-95, 125, -10) (-95, 140, -5) (-95, 110, -5)
sketch "Sketch45" plane through (-75, 200, 0) normal (0, 0, 1) x (1, 0, 0)
  line L0 (-20, -10) -> (-20, -140) projected
  line L1 (70, -140) -> (70, -10) projected
  line L2 (-20, -140) -> (70, -140)
  line L3 (70, -140) -> (70, -125)
  line L4 (70, -125) -> (-20, -125)
  line L5 (-20, -125) -> (-20, -140)
  line L6 (-20, -10) -> (70, -10) projected
  line L7 (-20, -10) -> (70, -10)
  line L8 (70, -10) -> (70, -25)
  line L9 (70, -25) -> (-20, -25)
  line L10 (-20, -25) -> (-20, -10)
  point P0 (75, -200)
  dimension "d158" = 15
  dimension "d159" = 15
extrude "Extrusion40" cut sketch "Sketch45" against normal up to surface (50 mm away) contours L6 L1 L9 L0 | L4 L1 L2 L0
sketch "Sketch46" plane through (-75, 200, 0) normal (0, 0, 1) x (1, 0, 0)
  circle A0 centre (25, -75) radius 5 projected
  circle A1 centre (25, -75) radius 5
  point P0 (75, -200)
extrude "Extrusion41" add sketch "Sketch46" against normal up to surface (50 mm away)
sketch "Sketch47" plane through (-95, 175, 0) normal (0, 1, 0) x (1, 0, 0)
  circle A0 centre (45, 25) radius 7.5 projected
  circle A1 centre (45, 25) radius 7.5
  circle A2 centre (45, 25) radius 7.5 projected
  point P0 (95, 0)
extrude "Extrusion42" cut sketch "Sketch47" against normal up to surface (100 mm away)
fillet "Fillet9" radius 20 4 edges at (-95, 175, -25) (-95, 75, -25) (-5, 75, -25) (-5, 175, -25)
fillet "Fillet10" radius 2 32 edges at (-89.1421, 80.8579, -50) (-50, 75, -50) (-10.8579, 80.8579, -50) (-5, 125, -50) (-10.8579, 169.1421, -50) (-50, 175, -50) (-89.1421, 169.1421, -50) (-95, 125, -50) (-50, 175, 0) (-10.8579, 169.1421, 0) (-5, 148.5, 0) (-5, 101.5, 0) (-5.5858, 140.5858, 0) (-18.5, 140, 0) (-33.5355, 138.5355, 0) (-35, 125, 0) (-33.5355, 111.4645, 0) (-18.5, 110, 0) (-5.5858, 109.4142, 0) (-10.8579, 80.8579, 0) (-50, 75, 0) (-89.1421, 80.8579, 0) (-95, 148.5, 0) (-95, 101.5, 0) (-94.4142, 109.4142, 0) (-81.5, 110, 0) (-66.4645, 111.4645, 0) (-65, 125, 0) (-66.4645, 138.5355, 0) (-81.5, 140, 0) (-94.4142, 140.5858, 0) (-89.1421, 169.1421, 0)
sketch "Sketch48" plane through (-75, 75, -2) normal (0, -1, 0) x (1, 0, 0)
  circle A0 centre (25, -23) radius 7.5 projected
  circle A1 centre (25, -23) radius 7.5
  point P0 (75, 2)
extrude "Extrusion43" add sketch "Sketch48" against normal up to surface (100 mm away)
sketch "Sketch49" plane through (-75, 75, -2) normal (0, -1, 0) x (1, 0, 0)
  circle A0 centre (25, -23) radius 7.5 projected
  circle A1 centre (25, -23) radius 6
  point P0 (75, 2)
  dimension "d170" = 12
extrude "Extrusion44" cut sketch "Sketch49" against normal up to surface (100 mm away) contours A1
sketch "Sketch50" plane through (-75, 75, -2) normal (0, -1, 0) x (1, 0, 0)
  circle A0 centre (25, -23) radius 6 projected
  circle A1 centre (25, -23) radius 6.4
  point P0 (75, 2)
  dimension "d173" = 12.8
extrude "Extrusion45" cut sketch "Sketch50" against normal up to surface (100 mm away)
properties part number "Madeira" material "PBT Plastic"
